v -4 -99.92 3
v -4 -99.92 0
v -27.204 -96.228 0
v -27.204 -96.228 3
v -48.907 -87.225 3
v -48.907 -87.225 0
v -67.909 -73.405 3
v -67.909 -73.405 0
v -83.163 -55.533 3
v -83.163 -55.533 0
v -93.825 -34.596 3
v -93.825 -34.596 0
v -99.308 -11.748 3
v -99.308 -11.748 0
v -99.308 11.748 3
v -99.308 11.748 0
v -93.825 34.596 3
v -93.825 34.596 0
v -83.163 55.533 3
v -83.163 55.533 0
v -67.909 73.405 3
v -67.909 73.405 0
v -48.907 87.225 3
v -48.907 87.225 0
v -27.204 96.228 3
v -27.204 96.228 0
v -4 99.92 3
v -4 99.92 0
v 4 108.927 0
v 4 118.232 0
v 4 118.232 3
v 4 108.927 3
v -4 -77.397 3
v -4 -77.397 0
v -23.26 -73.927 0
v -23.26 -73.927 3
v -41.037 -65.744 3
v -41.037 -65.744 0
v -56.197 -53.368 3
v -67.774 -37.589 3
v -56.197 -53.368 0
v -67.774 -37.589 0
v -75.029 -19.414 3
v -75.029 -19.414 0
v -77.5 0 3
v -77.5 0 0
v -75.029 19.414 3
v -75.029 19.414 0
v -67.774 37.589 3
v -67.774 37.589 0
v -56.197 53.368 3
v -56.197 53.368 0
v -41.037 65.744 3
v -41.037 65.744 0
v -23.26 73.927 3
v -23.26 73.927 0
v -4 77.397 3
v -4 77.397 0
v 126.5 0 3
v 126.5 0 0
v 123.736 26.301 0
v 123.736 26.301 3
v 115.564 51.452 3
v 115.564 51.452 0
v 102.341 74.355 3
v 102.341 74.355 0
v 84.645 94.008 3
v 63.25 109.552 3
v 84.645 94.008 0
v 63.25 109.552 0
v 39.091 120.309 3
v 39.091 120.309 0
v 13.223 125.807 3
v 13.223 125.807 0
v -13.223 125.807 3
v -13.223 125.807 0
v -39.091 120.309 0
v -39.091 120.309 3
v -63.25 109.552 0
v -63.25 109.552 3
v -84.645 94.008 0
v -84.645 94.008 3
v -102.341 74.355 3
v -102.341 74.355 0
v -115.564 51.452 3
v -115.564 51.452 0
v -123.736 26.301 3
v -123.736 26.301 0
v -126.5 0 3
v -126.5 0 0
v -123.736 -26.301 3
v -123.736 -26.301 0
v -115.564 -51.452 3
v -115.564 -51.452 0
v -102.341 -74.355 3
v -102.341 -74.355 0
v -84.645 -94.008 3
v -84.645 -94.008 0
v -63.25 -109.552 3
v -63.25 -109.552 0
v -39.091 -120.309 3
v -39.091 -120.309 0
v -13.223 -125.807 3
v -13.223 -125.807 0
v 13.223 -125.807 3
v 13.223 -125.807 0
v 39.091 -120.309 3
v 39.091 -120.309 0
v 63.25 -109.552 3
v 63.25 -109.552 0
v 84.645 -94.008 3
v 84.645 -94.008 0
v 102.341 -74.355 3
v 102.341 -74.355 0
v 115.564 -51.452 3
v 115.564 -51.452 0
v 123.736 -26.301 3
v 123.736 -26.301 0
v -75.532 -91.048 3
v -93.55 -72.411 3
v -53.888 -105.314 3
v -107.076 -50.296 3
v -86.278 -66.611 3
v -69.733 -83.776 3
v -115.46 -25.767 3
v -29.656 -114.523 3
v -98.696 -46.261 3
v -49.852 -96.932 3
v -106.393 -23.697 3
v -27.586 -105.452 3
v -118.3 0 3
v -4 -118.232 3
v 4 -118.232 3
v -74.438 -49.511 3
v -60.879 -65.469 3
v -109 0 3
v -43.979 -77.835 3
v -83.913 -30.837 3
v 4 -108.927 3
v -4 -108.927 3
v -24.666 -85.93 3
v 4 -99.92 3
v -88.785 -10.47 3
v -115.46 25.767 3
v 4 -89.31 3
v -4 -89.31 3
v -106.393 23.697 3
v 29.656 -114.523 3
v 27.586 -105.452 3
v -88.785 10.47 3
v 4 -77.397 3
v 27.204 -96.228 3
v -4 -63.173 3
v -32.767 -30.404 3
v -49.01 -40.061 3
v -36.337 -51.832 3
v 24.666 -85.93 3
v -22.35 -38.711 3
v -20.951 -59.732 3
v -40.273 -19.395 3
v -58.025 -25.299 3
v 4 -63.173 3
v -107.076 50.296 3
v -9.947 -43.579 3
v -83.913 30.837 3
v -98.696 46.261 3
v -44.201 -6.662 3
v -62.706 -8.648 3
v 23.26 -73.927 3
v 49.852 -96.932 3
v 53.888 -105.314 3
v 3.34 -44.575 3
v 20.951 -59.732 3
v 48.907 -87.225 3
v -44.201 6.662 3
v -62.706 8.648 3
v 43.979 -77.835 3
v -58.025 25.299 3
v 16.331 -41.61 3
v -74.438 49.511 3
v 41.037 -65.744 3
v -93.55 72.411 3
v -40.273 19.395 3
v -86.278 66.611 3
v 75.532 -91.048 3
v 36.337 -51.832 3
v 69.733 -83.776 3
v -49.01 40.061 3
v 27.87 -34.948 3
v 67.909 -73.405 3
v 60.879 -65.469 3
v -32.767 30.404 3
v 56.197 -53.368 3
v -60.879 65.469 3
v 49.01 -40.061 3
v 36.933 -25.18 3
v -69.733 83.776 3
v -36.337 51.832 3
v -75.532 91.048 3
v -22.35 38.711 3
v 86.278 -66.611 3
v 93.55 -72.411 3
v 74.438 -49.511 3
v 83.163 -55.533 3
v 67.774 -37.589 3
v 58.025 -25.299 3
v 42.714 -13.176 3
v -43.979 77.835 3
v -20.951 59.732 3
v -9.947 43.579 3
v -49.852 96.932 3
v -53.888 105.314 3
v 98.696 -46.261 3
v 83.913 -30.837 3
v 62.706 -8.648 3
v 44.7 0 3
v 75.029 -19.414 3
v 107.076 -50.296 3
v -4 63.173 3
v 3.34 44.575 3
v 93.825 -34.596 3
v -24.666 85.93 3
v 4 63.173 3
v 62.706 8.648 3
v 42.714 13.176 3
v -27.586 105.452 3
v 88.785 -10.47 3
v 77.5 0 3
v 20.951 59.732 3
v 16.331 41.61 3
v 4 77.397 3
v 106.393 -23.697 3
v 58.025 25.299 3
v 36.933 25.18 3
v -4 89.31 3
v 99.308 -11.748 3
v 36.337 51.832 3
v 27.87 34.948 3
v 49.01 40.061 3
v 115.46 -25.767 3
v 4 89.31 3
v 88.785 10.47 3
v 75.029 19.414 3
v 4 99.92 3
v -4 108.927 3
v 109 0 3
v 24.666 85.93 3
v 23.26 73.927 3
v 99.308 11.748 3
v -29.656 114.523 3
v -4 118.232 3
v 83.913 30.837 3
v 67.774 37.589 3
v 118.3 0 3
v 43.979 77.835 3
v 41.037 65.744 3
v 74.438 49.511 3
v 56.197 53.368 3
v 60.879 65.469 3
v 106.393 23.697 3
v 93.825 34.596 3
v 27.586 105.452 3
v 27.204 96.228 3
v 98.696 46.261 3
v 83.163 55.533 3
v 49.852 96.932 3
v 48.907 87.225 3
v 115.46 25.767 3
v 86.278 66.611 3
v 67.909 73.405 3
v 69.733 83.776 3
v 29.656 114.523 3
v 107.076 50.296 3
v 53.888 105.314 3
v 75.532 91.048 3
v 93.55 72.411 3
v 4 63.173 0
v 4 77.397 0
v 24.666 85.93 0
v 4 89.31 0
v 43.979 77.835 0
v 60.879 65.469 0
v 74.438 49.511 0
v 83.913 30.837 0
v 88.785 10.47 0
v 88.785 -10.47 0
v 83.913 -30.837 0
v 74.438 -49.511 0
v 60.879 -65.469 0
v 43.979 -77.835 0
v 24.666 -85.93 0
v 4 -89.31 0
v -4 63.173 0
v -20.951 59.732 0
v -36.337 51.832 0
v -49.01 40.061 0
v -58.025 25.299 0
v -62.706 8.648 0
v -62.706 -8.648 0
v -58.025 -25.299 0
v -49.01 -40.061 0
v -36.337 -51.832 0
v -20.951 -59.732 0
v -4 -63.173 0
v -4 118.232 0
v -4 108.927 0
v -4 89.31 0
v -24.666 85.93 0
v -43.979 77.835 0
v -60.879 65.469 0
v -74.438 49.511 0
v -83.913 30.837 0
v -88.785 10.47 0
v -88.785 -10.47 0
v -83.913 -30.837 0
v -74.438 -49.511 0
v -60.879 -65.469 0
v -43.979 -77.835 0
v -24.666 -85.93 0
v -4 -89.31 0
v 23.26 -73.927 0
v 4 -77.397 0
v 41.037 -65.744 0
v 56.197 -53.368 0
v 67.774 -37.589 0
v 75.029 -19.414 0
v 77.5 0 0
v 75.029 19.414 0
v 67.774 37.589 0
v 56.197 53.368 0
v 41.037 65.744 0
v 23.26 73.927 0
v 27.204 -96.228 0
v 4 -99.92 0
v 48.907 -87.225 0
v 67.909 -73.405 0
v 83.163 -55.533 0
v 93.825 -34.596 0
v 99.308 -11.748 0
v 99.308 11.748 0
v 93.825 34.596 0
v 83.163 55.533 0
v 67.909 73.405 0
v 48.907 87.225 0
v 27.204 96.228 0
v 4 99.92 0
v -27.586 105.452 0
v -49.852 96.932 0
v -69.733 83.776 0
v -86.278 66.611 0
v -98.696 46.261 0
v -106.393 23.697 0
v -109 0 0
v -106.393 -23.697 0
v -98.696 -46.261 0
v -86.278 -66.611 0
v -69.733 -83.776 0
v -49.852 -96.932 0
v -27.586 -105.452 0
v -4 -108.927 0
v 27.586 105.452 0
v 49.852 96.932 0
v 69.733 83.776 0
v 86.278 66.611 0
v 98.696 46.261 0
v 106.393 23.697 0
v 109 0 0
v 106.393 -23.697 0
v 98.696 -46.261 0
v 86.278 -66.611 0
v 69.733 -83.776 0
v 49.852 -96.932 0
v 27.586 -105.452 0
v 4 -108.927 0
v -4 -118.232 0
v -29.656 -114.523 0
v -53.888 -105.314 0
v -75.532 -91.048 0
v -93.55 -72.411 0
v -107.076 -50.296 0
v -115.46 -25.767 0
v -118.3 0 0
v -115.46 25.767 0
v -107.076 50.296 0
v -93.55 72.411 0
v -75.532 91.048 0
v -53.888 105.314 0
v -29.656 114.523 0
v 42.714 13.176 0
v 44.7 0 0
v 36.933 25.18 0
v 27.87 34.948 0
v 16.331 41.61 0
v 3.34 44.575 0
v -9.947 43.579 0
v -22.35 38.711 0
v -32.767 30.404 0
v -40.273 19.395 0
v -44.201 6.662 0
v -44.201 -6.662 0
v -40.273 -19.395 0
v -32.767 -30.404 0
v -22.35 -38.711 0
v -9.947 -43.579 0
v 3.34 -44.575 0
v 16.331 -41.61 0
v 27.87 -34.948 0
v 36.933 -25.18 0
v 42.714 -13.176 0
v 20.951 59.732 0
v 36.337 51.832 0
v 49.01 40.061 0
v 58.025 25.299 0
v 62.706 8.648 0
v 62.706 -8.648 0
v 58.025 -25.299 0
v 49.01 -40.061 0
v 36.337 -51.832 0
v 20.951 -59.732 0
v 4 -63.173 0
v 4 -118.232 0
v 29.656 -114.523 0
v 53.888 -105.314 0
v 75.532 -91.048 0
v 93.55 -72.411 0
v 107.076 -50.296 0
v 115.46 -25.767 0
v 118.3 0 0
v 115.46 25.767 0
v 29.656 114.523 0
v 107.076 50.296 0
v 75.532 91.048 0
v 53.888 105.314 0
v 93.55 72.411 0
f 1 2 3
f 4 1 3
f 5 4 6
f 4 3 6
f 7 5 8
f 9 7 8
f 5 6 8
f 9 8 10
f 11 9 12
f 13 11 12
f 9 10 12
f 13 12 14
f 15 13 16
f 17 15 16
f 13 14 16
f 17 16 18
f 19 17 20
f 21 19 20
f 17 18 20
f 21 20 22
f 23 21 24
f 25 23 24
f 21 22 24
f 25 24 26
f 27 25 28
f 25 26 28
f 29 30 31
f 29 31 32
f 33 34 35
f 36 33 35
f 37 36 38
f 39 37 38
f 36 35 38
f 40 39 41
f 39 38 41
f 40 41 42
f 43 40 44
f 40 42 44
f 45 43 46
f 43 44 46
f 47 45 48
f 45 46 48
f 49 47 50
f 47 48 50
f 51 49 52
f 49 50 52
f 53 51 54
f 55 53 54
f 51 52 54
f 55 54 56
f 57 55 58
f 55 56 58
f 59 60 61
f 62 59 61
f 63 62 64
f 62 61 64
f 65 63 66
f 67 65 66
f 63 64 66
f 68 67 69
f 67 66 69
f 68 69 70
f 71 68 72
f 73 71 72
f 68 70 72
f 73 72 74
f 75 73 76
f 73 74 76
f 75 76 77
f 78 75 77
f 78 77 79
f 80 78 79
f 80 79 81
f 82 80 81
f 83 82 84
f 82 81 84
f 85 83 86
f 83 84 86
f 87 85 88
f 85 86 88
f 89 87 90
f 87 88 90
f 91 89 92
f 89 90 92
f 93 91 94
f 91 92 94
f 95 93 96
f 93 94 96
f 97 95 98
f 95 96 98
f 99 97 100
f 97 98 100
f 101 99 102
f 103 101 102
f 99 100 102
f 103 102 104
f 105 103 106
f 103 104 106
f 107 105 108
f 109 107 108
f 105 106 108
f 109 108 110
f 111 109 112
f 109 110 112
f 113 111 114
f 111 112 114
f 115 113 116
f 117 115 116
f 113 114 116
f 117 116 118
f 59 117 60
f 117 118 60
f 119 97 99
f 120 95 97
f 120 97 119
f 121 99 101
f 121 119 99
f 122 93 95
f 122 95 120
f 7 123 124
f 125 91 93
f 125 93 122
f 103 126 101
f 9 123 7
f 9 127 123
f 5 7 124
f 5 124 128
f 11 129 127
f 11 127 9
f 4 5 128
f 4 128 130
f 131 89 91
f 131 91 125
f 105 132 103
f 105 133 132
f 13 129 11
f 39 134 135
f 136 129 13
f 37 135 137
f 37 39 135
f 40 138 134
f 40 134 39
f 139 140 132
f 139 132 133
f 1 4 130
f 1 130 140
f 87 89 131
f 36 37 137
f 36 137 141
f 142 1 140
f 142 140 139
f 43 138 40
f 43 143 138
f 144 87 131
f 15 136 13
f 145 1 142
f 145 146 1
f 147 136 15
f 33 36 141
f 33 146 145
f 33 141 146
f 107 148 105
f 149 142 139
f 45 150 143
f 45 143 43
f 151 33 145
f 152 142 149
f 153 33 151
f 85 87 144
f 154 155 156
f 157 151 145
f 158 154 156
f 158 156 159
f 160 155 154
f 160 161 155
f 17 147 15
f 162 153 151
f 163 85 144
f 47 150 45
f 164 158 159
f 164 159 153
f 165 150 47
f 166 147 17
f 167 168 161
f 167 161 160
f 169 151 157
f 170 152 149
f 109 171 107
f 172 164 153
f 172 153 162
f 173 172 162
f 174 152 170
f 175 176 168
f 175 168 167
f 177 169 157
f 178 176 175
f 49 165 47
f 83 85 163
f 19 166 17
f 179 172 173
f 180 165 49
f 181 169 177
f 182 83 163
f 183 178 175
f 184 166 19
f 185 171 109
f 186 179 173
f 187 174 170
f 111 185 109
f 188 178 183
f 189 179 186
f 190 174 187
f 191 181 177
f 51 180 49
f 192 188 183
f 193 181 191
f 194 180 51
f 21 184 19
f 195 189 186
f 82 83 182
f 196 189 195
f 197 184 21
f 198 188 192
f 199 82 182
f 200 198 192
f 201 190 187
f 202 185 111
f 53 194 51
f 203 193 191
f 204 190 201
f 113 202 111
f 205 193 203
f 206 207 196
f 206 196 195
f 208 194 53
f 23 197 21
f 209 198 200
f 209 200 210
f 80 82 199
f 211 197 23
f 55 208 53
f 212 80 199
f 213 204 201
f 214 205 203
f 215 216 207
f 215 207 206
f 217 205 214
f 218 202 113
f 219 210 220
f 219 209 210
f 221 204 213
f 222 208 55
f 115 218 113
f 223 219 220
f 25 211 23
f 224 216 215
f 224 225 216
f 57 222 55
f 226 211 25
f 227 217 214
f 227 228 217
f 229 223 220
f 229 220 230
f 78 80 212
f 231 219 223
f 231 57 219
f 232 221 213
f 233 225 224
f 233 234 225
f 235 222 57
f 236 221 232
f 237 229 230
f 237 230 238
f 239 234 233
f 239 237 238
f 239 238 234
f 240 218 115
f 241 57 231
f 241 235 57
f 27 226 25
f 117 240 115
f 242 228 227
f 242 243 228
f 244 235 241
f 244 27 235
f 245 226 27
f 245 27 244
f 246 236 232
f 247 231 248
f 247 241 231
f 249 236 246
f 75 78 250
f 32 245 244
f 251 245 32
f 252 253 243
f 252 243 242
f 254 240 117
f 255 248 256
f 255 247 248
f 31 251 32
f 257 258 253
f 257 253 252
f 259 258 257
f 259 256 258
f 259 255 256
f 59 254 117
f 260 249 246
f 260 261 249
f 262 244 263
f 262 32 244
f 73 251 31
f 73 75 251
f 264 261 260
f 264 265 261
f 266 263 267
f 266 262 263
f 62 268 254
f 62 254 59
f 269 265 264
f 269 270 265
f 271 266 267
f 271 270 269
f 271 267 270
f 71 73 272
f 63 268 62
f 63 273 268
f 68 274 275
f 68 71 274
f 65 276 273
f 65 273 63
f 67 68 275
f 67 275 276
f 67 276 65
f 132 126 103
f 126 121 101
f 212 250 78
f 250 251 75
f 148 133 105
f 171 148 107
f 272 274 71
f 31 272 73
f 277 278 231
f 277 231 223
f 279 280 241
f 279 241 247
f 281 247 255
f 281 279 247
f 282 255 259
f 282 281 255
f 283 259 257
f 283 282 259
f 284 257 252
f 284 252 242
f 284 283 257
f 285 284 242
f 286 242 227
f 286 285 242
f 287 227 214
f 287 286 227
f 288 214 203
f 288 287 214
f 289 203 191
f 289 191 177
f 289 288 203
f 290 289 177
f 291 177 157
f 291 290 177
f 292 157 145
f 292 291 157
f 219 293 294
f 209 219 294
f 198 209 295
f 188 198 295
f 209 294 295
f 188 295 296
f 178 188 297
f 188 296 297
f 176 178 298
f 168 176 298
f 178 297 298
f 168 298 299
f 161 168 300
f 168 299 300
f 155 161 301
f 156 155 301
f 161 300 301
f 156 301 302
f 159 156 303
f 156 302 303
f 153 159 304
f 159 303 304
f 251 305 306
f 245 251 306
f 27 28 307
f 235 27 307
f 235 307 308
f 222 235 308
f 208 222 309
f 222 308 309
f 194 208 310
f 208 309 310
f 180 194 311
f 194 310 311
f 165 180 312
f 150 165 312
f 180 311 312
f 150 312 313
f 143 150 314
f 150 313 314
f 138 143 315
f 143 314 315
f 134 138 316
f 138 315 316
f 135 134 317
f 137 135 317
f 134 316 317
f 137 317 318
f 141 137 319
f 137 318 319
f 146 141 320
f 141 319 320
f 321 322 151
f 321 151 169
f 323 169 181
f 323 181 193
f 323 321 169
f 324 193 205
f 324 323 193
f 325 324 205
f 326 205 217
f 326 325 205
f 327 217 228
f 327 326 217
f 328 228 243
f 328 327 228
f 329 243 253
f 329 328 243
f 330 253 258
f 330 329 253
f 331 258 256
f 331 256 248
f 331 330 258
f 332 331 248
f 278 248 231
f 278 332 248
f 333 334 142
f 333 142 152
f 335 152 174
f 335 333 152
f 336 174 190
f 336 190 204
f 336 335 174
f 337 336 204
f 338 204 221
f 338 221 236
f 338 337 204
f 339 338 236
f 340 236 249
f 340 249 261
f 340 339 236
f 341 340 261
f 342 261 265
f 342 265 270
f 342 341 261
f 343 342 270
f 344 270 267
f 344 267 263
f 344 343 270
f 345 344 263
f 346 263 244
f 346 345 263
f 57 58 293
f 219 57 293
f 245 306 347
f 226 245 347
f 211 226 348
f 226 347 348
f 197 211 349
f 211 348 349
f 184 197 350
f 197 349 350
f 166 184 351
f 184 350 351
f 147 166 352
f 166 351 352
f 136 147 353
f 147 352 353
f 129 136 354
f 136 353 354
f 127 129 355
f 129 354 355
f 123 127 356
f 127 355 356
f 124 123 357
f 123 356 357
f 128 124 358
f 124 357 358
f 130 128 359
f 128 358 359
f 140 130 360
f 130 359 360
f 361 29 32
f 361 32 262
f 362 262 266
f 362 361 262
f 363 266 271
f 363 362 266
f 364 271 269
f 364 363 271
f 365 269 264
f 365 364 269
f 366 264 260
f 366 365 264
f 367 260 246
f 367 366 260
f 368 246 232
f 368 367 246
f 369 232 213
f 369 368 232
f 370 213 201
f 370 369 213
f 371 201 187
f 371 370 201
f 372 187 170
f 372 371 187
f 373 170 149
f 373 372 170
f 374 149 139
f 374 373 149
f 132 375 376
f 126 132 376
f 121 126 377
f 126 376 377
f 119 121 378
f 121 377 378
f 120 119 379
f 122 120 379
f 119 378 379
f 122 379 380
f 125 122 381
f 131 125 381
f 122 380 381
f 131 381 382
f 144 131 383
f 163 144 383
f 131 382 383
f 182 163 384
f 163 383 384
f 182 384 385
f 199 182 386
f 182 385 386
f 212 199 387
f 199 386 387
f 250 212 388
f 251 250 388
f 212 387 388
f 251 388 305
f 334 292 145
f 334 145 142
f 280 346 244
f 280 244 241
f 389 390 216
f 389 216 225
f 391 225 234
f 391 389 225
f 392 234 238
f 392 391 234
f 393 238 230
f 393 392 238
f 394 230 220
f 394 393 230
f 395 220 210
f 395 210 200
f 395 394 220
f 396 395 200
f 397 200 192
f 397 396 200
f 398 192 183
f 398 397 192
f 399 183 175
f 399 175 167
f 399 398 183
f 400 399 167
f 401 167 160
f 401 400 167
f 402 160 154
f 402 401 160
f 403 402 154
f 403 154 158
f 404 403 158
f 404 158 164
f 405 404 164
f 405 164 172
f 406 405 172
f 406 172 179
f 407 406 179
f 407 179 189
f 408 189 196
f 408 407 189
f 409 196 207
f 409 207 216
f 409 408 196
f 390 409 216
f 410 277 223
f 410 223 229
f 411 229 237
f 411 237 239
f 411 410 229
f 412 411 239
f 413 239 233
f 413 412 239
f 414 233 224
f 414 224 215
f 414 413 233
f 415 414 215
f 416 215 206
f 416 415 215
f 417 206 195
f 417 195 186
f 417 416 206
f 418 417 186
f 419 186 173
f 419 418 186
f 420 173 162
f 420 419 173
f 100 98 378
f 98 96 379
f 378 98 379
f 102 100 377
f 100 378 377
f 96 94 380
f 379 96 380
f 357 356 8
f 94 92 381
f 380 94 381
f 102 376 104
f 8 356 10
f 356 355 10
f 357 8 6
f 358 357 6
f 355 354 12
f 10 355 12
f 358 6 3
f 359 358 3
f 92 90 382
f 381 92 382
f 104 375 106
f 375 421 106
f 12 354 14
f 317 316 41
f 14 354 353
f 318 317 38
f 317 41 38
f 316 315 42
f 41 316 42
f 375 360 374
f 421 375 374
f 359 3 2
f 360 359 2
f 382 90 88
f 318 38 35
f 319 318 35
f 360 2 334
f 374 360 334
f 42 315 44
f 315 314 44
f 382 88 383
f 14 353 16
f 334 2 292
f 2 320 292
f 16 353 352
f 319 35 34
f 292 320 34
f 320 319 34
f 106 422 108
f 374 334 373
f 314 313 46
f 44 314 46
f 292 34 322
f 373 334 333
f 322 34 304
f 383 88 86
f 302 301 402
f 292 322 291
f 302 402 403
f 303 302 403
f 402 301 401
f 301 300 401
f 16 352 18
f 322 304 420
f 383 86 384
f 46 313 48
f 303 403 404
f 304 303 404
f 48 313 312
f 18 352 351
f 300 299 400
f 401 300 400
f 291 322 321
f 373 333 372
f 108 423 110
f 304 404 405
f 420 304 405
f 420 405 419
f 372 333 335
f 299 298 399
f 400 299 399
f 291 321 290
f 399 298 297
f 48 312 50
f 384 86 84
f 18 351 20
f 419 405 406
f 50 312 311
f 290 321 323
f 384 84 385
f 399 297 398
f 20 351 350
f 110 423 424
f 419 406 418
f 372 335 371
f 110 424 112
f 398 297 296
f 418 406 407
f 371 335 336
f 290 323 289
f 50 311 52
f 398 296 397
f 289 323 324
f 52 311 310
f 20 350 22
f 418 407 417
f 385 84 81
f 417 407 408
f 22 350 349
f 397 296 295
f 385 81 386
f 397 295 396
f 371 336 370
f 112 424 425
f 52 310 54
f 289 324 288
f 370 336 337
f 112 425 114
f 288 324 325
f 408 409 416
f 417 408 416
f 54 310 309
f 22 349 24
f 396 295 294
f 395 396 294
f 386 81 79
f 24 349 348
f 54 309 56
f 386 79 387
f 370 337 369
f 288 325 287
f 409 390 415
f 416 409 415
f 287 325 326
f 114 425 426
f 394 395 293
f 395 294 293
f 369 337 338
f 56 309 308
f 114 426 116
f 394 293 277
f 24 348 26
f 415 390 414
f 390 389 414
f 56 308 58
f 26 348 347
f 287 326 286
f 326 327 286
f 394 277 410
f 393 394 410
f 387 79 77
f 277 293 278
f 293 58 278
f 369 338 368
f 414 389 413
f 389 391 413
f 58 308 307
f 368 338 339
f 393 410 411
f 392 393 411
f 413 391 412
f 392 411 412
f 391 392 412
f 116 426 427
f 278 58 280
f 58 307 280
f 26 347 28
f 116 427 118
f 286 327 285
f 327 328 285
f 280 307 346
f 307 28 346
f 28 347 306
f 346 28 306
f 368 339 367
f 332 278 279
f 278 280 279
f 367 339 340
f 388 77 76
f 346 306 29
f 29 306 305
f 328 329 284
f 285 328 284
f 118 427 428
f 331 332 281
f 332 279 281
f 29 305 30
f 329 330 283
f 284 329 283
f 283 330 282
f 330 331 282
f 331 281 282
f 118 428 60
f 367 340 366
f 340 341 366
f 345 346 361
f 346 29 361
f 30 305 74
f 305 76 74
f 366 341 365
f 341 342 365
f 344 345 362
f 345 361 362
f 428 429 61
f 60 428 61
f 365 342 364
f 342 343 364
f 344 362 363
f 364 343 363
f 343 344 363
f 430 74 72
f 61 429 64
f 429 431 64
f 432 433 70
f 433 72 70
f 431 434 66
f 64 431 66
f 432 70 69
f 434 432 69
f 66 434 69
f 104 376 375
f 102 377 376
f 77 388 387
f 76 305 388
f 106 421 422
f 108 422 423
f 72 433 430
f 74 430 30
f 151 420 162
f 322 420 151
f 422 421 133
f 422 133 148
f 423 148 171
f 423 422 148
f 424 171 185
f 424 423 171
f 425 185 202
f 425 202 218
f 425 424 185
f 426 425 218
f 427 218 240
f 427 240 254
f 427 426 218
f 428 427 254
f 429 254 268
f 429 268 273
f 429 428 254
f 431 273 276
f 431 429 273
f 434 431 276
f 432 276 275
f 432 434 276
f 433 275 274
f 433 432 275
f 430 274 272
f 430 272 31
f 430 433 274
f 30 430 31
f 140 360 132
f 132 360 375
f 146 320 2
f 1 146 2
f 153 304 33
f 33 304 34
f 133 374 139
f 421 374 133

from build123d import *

# Parameters (mm, degrees)
SKETCH_1_R      = 126.5
SKETCH_1_R_2    = 44.7
EXTRUDE_1_DEPTH = 3


with BuildPart() as part:
    # 草图1 → 凸台-拉伸1 (new body)
    with BuildSketch(Plane.XY):
        Circle(SKETCH_1_R)
        Circle(SKETCH_1_R_2, mode=Mode.SUBTRACT)
        with BuildLine():
            Line((-4, 118.232355978), (-4, 108.926580778))
            ThreePointArc((-4, 108.926580778), (-109, 0), (-4, -108.926580778))
            Line((-4, -108.926580778), (-4, -118.232355978))
            ThreePointArc((-4, -118.232355978), (-118.3, 0), (-4, 118.232355978))
        make_face(mode=Mode.SUBTRACT)
        with BuildLine():
            Line((4, 118.232355978), (4, 108.926580778))
            ThreePointArc((4, 108.926580778), (109, 0), (4, -108.926580778))
            Line((4, -108.926580778), (4, -118.232355978))
            ThreePointArc((4, -118.232355978), (118.3, 0), (4, 118.232355978))
        make_face(mode=Mode.SUBTRACT)
        with BuildLine():
            Line((4, -63.173491276), (4, -77.396705356))
            ThreePointArc((4, -77.396705356), (77.5, 0), (4, 77.396705356))
            Line((4, 77.396705356), (4, 63.173491276))
            ThreePointArc((4, 63.173491276), (63.3, 0), (4, -63.173491276))
        make_face(mode=Mode.SUBTRACT)
        with BuildLine():
            Line((-4, -63.173491276), (-4, -77.396705356))
            ThreePointArc((-4, -77.396705356), (-77.5, 0), (-4, 77.396705356))
            Line((-4, 77.396705356), (-4, 63.173491276))
            ThreePointArc((-4, 63.173491276), (-63.3, 0), (-4, -63.173491276))
        make_face(mode=Mode.SUBTRACT)
        with BuildLine():
            Line((-4, 99.919967974), (-4, 89.310469711))
            ThreePointArc((-4, 89.310469711), (-89.4, 0), (-4, -89.310469711))
            Line((-4, -89.310469711), (-4, -99.919967974))
            ThreePointArc((-4, -99.919967974), (-100, 0), (-4, 99.919967974))
        make_face(mode=Mode.SUBTRACT)
        with BuildLine():
            Line((4, 99.919967974), (4, 89.310469711))
            ThreePointArc((4, 89.310469711), (89.4, 0), (4, -89.310469711))
            Line((4, -89.310469711), (4, -99.919967974))
            ThreePointArc((4, -99.919967974), (100, 0), (4, 99.919967974))
        make_face(mode=Mode.SUBTRACT)
    extrude(amount=EXTRUDE_1_DEPTH)


solid = part.part
